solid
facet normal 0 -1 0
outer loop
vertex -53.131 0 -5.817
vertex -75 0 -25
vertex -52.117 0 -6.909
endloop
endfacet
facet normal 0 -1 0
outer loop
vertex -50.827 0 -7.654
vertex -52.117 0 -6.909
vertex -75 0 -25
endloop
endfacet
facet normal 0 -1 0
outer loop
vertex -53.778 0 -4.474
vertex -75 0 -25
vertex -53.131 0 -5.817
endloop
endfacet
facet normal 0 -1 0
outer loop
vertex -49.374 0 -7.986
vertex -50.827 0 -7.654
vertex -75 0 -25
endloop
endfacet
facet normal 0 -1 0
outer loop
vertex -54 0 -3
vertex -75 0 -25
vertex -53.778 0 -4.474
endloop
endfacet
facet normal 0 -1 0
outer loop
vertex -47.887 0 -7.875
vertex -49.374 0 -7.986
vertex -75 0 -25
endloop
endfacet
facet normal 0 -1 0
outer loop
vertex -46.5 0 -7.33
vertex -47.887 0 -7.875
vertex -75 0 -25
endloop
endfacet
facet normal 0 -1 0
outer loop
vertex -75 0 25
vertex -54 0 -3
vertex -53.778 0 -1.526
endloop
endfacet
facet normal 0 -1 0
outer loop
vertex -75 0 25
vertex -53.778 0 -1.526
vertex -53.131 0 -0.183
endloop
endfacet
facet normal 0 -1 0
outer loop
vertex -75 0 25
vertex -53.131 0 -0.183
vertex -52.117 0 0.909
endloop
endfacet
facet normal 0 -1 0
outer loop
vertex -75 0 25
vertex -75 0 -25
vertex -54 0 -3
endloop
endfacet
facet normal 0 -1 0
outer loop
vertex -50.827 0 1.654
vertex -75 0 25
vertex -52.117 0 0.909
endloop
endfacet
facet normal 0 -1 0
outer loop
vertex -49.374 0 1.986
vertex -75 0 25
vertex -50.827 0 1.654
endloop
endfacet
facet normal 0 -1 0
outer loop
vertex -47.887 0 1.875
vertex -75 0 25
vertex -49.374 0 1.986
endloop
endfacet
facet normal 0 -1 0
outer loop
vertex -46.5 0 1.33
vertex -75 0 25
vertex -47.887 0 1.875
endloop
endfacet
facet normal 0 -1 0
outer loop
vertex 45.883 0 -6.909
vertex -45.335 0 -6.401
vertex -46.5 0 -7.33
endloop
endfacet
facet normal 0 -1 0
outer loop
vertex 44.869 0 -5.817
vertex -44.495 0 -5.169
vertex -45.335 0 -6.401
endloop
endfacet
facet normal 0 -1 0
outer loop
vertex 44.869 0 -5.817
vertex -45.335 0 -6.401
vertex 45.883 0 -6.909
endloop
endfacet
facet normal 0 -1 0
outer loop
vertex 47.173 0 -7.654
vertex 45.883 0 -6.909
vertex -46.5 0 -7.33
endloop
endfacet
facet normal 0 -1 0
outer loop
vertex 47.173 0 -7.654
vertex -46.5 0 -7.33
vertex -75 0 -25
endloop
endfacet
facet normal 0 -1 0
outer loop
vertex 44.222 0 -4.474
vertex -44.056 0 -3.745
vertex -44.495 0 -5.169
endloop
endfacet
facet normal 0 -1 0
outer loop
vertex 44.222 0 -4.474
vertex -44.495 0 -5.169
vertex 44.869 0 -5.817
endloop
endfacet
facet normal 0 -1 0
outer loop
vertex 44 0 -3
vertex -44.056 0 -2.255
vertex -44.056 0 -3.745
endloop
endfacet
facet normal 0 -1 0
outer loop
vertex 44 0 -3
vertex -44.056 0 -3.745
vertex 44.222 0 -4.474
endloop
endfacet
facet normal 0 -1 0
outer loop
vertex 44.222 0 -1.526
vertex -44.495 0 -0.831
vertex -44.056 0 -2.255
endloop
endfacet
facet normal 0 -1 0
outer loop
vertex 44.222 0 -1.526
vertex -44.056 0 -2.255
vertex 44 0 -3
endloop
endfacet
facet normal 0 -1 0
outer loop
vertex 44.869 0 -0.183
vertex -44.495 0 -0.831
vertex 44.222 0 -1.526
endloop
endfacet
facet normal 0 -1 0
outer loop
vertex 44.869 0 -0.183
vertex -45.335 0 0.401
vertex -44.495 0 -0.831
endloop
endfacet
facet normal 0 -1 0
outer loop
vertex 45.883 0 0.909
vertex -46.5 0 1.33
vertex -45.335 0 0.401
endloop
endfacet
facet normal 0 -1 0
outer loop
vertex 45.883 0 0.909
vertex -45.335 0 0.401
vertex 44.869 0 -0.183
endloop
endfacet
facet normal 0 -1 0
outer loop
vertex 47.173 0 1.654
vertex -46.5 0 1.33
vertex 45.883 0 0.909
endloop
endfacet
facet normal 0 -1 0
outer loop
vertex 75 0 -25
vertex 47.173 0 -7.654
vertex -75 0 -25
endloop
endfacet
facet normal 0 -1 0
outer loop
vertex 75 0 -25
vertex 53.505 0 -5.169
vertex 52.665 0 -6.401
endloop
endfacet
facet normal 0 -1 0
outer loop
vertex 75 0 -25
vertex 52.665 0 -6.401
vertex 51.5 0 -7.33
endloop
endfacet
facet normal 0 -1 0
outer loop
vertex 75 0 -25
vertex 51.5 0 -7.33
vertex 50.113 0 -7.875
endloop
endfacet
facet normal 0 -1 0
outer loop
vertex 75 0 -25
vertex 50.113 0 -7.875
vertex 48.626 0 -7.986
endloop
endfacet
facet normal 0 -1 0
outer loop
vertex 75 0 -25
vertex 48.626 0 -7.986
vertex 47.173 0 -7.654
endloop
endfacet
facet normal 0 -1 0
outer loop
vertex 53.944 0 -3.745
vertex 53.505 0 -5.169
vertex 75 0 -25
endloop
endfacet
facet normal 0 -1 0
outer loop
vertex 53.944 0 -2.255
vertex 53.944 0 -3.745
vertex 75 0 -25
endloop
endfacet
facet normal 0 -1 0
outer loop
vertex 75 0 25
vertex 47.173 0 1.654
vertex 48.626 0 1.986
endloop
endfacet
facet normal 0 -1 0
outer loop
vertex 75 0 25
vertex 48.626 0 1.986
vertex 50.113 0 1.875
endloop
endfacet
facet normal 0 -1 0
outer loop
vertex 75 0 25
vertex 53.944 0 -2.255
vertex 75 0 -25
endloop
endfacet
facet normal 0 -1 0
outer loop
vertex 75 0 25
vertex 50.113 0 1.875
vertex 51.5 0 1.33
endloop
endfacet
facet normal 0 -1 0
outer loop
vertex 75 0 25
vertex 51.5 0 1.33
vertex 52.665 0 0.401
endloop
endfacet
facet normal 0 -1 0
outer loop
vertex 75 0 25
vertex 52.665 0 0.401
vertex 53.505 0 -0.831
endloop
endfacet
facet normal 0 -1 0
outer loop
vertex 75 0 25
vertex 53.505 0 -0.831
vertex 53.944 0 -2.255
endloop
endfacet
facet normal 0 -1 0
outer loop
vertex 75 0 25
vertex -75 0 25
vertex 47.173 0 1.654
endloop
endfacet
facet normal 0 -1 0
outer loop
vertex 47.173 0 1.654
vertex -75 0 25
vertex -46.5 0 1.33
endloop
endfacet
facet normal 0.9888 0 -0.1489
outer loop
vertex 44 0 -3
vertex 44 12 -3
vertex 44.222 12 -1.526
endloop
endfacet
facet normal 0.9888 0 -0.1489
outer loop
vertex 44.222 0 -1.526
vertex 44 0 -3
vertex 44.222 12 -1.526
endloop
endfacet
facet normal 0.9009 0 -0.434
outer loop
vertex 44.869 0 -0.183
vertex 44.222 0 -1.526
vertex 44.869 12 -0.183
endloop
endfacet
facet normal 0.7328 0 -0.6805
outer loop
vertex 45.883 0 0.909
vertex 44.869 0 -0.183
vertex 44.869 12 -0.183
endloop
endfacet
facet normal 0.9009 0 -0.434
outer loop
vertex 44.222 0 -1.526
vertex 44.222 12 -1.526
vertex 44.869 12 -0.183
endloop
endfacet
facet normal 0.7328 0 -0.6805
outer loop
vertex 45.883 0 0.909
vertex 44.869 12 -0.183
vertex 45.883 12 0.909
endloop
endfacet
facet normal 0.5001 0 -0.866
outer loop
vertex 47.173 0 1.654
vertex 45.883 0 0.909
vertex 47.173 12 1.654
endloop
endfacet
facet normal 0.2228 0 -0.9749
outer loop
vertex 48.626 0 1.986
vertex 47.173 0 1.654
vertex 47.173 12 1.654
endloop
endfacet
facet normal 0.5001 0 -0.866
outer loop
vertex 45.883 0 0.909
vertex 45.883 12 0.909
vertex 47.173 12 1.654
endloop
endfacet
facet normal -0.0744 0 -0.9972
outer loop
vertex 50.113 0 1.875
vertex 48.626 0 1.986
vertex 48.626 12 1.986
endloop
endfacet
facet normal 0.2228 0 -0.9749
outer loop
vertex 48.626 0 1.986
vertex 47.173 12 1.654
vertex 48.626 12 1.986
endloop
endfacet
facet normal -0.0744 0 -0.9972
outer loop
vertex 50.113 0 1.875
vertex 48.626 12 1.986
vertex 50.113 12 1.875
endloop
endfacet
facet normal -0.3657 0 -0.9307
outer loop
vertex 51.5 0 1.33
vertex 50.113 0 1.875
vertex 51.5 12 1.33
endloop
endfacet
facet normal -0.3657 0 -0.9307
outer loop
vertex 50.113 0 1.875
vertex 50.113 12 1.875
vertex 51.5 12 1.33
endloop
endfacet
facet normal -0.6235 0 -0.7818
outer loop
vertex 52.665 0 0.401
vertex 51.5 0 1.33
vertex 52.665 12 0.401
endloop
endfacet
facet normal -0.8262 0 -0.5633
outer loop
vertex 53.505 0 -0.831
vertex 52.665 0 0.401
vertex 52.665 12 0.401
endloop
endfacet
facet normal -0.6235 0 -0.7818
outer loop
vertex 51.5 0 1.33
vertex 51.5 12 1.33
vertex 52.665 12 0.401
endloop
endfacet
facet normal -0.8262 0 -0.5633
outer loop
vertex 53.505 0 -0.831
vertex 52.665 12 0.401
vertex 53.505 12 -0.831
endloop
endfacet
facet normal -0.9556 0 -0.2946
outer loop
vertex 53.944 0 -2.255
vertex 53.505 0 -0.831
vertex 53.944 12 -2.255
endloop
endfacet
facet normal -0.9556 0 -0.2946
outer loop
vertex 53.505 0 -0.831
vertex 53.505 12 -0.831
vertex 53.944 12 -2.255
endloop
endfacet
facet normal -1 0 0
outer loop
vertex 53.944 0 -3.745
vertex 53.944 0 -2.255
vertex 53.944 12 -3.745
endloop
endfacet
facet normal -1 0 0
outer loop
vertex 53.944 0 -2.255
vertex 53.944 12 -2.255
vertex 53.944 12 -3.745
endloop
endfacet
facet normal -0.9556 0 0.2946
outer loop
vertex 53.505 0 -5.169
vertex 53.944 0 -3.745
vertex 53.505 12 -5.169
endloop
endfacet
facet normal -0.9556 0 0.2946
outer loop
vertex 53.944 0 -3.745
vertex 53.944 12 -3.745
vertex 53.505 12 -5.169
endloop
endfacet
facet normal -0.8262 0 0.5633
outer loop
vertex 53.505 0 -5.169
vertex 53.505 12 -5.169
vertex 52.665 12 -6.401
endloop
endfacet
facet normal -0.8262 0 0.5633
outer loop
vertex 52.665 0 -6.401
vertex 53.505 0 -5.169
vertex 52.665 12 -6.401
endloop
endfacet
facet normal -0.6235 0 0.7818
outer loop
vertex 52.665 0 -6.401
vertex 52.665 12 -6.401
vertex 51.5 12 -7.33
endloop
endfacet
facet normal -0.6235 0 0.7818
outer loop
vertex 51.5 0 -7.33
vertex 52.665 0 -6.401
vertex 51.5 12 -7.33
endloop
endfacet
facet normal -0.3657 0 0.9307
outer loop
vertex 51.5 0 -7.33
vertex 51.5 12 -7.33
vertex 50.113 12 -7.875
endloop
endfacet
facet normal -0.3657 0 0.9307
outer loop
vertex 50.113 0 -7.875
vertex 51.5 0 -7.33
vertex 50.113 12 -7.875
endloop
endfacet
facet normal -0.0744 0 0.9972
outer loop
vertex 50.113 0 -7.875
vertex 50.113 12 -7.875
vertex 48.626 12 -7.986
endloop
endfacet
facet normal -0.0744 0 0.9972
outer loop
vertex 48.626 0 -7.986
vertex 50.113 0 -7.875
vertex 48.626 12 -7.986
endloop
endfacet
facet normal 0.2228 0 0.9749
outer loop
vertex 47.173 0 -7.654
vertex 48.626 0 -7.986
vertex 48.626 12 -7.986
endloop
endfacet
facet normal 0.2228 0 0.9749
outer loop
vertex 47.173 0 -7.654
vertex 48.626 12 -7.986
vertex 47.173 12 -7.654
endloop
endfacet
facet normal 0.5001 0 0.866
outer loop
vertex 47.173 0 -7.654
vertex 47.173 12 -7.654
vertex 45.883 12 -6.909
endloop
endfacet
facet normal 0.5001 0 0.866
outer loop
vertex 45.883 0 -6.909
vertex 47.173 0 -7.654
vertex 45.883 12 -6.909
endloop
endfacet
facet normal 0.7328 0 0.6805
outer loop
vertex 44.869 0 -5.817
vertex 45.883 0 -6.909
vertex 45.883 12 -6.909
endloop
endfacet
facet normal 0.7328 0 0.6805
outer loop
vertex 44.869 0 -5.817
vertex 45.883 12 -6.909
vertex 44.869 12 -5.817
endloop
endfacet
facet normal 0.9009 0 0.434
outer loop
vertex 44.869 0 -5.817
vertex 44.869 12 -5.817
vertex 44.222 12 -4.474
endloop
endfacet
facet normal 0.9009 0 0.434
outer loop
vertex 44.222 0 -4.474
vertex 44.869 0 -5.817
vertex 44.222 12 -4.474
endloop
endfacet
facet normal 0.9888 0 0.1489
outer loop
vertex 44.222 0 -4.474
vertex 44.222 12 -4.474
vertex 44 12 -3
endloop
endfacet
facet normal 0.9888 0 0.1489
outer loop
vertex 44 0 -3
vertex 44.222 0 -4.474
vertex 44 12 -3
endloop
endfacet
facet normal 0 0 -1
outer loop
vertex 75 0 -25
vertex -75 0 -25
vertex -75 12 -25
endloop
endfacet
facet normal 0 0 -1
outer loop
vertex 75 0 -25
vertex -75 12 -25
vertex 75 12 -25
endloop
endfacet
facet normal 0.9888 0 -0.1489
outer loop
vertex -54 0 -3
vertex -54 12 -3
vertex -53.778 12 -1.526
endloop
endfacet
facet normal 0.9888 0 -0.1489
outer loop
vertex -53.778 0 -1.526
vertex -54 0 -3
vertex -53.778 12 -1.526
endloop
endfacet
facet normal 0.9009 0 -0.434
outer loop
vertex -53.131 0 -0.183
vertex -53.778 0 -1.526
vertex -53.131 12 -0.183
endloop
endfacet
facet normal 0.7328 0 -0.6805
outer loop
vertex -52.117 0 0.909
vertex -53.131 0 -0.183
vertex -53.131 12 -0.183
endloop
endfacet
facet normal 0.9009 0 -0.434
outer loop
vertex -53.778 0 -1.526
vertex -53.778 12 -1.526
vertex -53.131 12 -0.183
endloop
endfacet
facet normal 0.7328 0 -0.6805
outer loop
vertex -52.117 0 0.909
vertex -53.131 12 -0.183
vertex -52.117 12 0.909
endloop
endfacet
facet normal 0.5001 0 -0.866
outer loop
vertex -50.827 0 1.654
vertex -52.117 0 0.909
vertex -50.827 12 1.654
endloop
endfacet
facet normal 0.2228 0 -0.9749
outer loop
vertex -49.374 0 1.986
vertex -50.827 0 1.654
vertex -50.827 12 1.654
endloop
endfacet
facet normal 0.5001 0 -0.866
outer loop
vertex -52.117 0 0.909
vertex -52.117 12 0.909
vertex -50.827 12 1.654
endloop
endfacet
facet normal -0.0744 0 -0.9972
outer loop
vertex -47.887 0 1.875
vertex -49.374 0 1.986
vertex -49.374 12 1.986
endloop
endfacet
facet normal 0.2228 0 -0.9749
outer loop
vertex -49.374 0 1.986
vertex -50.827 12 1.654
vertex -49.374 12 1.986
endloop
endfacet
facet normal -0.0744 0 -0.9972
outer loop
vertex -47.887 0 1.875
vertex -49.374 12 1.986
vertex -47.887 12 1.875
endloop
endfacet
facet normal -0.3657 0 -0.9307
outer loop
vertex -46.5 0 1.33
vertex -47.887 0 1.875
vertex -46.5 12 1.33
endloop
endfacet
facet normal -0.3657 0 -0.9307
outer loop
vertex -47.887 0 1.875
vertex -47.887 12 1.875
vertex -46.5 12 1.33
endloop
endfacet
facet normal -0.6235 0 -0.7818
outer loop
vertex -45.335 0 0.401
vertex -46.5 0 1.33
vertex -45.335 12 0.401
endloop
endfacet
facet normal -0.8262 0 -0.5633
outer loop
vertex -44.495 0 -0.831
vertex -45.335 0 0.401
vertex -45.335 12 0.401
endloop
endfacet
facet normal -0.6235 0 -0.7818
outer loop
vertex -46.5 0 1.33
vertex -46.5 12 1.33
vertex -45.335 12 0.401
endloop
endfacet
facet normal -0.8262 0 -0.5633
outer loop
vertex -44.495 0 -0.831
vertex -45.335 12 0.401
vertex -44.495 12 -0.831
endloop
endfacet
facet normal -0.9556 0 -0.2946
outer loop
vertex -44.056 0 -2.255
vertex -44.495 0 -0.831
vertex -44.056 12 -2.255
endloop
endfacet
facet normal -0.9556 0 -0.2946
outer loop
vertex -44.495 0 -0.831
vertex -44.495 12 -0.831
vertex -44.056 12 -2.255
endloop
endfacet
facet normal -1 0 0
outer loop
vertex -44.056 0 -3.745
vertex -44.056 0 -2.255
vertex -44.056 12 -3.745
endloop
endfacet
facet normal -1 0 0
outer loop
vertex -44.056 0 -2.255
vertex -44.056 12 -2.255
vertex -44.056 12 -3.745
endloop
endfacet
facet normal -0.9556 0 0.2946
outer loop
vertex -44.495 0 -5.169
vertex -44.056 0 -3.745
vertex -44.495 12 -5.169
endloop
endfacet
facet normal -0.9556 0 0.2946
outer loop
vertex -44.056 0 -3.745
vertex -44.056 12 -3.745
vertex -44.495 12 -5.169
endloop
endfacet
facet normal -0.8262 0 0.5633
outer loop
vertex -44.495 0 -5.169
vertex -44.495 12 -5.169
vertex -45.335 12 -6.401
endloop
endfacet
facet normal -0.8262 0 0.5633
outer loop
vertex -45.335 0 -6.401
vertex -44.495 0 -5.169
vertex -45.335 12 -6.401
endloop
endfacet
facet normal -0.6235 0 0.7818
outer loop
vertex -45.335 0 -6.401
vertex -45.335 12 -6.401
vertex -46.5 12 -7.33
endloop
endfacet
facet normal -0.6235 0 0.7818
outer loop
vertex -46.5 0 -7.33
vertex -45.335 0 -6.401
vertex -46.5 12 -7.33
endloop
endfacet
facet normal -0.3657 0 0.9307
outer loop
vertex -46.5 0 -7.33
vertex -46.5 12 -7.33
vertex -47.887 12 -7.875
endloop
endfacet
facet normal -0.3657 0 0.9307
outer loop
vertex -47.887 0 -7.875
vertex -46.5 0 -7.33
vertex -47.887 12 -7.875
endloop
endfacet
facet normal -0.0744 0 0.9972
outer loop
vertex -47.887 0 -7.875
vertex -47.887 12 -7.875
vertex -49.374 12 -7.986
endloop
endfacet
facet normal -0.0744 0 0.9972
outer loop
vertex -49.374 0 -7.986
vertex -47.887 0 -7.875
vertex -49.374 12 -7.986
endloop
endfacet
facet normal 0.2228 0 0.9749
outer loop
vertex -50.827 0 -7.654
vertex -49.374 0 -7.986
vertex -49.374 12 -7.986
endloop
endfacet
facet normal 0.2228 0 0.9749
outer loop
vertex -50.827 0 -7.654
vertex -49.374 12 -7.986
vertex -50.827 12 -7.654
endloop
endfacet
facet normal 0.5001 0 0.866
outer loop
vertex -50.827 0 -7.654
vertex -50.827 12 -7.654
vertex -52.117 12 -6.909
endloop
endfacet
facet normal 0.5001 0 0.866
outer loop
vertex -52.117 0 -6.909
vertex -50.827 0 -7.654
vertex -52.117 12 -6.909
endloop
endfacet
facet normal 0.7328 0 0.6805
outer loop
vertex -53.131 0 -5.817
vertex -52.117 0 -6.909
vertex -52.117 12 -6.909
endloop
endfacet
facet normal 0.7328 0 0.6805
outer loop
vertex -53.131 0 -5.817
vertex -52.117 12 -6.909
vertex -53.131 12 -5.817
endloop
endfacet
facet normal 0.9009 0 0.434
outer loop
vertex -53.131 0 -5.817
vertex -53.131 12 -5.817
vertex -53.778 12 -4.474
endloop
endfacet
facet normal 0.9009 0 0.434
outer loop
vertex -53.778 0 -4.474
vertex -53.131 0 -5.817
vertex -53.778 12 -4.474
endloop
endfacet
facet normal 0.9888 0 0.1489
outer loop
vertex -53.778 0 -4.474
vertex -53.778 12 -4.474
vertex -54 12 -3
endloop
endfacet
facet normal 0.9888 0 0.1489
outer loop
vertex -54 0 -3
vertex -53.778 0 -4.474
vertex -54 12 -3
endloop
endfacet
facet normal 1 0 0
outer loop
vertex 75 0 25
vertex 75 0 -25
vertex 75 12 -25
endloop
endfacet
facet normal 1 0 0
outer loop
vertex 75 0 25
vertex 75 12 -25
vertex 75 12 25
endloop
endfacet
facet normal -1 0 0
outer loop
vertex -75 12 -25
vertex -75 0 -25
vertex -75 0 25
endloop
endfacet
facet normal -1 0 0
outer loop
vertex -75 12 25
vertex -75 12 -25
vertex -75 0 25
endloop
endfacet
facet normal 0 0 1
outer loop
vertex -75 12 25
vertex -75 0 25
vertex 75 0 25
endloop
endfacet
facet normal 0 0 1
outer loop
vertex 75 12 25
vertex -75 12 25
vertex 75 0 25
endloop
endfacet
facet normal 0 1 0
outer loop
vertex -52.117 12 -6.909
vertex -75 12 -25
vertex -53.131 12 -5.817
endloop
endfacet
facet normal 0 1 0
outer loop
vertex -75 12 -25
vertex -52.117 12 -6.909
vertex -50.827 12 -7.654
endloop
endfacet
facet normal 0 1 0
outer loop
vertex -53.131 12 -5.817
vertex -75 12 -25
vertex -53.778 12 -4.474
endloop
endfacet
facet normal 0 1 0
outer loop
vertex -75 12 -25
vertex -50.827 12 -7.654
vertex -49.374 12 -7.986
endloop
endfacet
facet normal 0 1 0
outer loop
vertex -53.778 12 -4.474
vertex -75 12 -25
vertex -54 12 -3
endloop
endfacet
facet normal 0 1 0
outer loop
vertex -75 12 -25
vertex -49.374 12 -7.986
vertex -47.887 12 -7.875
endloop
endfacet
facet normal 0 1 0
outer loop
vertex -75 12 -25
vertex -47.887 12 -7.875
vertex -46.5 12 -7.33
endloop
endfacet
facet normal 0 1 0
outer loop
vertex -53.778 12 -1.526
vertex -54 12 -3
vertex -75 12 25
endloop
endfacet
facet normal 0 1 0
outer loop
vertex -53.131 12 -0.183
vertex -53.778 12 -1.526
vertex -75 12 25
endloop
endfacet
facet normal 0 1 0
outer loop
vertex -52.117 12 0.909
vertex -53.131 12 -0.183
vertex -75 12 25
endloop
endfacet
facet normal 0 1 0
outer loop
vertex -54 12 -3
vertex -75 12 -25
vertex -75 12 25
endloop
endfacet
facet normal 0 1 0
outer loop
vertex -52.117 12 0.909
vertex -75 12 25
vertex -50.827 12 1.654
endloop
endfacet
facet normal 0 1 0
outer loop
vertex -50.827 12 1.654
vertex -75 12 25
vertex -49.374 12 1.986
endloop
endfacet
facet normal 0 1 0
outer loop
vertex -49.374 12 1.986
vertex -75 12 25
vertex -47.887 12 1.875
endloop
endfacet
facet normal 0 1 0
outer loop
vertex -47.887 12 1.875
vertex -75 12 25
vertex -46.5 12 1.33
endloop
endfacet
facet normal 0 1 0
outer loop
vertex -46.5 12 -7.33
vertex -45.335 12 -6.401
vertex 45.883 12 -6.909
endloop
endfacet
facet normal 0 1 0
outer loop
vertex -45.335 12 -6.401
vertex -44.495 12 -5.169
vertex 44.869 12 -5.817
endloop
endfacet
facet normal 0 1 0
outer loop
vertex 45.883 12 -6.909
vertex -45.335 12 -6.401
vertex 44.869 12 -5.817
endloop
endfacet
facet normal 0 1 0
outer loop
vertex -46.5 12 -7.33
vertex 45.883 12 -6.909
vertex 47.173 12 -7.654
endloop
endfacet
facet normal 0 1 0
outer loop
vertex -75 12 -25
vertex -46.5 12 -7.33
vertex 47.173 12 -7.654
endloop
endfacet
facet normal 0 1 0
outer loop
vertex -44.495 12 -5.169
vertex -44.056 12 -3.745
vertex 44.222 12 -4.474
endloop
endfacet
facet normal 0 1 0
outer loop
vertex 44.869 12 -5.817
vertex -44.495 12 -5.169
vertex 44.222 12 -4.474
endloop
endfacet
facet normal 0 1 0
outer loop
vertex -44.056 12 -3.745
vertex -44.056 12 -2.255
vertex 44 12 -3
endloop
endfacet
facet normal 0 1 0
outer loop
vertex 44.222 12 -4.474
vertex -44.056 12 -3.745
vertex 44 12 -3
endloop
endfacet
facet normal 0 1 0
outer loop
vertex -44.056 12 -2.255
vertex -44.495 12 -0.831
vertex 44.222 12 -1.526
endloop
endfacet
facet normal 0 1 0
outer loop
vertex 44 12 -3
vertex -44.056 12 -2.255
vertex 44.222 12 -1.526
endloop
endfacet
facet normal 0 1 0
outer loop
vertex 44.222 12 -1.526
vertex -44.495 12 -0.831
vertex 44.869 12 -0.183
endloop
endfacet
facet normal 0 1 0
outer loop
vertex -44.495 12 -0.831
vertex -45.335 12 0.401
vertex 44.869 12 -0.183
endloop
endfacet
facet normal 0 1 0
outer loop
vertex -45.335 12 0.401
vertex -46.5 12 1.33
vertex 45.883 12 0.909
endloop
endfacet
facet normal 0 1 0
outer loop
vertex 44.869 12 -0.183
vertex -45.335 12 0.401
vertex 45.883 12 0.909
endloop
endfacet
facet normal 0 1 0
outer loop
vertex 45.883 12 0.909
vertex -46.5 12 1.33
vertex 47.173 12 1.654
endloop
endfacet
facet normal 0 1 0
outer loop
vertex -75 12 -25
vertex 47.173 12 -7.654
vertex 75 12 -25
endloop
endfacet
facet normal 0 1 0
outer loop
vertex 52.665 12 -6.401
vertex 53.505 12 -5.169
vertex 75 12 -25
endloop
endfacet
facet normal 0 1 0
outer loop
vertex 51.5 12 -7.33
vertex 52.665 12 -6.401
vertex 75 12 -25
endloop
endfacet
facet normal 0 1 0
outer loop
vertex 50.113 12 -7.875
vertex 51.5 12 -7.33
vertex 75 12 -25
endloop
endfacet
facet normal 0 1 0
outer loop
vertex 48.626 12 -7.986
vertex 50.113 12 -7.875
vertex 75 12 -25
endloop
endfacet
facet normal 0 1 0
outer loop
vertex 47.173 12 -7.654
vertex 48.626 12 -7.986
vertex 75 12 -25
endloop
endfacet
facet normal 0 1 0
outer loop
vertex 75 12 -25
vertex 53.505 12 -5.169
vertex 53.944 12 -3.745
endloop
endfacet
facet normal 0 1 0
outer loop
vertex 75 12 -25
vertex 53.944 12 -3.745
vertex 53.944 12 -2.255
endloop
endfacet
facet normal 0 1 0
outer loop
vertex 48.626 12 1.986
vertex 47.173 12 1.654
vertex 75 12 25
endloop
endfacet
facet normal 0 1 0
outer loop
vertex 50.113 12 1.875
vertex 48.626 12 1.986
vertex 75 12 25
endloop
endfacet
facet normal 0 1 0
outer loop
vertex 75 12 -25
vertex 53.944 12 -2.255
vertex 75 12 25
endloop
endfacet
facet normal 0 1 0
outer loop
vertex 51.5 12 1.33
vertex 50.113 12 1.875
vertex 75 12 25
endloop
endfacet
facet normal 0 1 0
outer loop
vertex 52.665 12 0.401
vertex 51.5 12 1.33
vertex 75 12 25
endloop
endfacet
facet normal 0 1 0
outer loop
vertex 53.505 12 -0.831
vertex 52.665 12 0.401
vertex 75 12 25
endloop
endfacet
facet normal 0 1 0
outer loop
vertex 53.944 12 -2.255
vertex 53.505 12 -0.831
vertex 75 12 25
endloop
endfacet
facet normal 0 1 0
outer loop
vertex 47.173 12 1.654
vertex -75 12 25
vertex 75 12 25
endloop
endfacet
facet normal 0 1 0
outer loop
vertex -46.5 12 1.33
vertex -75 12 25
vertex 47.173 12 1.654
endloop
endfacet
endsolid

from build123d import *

# Parameters (mm, degrees)
F0_W     = 150
F0_H     = 50
F1_DEPTH = 12
F2_D     = 10


with BuildPart() as f1:
    # F0 (on Front) → F1 (new body)
    with BuildSketch(Plane.XZ):
        Rectangle(F0_W, F0_H)
    extrude(amount=-F1_DEPTH)

    # F2 (through all)
    with Locations(Plane.XZ):
        with Locations((-49, -3), (49, -3)):
            Hole(F2_D / 2)


solid = f1.part
